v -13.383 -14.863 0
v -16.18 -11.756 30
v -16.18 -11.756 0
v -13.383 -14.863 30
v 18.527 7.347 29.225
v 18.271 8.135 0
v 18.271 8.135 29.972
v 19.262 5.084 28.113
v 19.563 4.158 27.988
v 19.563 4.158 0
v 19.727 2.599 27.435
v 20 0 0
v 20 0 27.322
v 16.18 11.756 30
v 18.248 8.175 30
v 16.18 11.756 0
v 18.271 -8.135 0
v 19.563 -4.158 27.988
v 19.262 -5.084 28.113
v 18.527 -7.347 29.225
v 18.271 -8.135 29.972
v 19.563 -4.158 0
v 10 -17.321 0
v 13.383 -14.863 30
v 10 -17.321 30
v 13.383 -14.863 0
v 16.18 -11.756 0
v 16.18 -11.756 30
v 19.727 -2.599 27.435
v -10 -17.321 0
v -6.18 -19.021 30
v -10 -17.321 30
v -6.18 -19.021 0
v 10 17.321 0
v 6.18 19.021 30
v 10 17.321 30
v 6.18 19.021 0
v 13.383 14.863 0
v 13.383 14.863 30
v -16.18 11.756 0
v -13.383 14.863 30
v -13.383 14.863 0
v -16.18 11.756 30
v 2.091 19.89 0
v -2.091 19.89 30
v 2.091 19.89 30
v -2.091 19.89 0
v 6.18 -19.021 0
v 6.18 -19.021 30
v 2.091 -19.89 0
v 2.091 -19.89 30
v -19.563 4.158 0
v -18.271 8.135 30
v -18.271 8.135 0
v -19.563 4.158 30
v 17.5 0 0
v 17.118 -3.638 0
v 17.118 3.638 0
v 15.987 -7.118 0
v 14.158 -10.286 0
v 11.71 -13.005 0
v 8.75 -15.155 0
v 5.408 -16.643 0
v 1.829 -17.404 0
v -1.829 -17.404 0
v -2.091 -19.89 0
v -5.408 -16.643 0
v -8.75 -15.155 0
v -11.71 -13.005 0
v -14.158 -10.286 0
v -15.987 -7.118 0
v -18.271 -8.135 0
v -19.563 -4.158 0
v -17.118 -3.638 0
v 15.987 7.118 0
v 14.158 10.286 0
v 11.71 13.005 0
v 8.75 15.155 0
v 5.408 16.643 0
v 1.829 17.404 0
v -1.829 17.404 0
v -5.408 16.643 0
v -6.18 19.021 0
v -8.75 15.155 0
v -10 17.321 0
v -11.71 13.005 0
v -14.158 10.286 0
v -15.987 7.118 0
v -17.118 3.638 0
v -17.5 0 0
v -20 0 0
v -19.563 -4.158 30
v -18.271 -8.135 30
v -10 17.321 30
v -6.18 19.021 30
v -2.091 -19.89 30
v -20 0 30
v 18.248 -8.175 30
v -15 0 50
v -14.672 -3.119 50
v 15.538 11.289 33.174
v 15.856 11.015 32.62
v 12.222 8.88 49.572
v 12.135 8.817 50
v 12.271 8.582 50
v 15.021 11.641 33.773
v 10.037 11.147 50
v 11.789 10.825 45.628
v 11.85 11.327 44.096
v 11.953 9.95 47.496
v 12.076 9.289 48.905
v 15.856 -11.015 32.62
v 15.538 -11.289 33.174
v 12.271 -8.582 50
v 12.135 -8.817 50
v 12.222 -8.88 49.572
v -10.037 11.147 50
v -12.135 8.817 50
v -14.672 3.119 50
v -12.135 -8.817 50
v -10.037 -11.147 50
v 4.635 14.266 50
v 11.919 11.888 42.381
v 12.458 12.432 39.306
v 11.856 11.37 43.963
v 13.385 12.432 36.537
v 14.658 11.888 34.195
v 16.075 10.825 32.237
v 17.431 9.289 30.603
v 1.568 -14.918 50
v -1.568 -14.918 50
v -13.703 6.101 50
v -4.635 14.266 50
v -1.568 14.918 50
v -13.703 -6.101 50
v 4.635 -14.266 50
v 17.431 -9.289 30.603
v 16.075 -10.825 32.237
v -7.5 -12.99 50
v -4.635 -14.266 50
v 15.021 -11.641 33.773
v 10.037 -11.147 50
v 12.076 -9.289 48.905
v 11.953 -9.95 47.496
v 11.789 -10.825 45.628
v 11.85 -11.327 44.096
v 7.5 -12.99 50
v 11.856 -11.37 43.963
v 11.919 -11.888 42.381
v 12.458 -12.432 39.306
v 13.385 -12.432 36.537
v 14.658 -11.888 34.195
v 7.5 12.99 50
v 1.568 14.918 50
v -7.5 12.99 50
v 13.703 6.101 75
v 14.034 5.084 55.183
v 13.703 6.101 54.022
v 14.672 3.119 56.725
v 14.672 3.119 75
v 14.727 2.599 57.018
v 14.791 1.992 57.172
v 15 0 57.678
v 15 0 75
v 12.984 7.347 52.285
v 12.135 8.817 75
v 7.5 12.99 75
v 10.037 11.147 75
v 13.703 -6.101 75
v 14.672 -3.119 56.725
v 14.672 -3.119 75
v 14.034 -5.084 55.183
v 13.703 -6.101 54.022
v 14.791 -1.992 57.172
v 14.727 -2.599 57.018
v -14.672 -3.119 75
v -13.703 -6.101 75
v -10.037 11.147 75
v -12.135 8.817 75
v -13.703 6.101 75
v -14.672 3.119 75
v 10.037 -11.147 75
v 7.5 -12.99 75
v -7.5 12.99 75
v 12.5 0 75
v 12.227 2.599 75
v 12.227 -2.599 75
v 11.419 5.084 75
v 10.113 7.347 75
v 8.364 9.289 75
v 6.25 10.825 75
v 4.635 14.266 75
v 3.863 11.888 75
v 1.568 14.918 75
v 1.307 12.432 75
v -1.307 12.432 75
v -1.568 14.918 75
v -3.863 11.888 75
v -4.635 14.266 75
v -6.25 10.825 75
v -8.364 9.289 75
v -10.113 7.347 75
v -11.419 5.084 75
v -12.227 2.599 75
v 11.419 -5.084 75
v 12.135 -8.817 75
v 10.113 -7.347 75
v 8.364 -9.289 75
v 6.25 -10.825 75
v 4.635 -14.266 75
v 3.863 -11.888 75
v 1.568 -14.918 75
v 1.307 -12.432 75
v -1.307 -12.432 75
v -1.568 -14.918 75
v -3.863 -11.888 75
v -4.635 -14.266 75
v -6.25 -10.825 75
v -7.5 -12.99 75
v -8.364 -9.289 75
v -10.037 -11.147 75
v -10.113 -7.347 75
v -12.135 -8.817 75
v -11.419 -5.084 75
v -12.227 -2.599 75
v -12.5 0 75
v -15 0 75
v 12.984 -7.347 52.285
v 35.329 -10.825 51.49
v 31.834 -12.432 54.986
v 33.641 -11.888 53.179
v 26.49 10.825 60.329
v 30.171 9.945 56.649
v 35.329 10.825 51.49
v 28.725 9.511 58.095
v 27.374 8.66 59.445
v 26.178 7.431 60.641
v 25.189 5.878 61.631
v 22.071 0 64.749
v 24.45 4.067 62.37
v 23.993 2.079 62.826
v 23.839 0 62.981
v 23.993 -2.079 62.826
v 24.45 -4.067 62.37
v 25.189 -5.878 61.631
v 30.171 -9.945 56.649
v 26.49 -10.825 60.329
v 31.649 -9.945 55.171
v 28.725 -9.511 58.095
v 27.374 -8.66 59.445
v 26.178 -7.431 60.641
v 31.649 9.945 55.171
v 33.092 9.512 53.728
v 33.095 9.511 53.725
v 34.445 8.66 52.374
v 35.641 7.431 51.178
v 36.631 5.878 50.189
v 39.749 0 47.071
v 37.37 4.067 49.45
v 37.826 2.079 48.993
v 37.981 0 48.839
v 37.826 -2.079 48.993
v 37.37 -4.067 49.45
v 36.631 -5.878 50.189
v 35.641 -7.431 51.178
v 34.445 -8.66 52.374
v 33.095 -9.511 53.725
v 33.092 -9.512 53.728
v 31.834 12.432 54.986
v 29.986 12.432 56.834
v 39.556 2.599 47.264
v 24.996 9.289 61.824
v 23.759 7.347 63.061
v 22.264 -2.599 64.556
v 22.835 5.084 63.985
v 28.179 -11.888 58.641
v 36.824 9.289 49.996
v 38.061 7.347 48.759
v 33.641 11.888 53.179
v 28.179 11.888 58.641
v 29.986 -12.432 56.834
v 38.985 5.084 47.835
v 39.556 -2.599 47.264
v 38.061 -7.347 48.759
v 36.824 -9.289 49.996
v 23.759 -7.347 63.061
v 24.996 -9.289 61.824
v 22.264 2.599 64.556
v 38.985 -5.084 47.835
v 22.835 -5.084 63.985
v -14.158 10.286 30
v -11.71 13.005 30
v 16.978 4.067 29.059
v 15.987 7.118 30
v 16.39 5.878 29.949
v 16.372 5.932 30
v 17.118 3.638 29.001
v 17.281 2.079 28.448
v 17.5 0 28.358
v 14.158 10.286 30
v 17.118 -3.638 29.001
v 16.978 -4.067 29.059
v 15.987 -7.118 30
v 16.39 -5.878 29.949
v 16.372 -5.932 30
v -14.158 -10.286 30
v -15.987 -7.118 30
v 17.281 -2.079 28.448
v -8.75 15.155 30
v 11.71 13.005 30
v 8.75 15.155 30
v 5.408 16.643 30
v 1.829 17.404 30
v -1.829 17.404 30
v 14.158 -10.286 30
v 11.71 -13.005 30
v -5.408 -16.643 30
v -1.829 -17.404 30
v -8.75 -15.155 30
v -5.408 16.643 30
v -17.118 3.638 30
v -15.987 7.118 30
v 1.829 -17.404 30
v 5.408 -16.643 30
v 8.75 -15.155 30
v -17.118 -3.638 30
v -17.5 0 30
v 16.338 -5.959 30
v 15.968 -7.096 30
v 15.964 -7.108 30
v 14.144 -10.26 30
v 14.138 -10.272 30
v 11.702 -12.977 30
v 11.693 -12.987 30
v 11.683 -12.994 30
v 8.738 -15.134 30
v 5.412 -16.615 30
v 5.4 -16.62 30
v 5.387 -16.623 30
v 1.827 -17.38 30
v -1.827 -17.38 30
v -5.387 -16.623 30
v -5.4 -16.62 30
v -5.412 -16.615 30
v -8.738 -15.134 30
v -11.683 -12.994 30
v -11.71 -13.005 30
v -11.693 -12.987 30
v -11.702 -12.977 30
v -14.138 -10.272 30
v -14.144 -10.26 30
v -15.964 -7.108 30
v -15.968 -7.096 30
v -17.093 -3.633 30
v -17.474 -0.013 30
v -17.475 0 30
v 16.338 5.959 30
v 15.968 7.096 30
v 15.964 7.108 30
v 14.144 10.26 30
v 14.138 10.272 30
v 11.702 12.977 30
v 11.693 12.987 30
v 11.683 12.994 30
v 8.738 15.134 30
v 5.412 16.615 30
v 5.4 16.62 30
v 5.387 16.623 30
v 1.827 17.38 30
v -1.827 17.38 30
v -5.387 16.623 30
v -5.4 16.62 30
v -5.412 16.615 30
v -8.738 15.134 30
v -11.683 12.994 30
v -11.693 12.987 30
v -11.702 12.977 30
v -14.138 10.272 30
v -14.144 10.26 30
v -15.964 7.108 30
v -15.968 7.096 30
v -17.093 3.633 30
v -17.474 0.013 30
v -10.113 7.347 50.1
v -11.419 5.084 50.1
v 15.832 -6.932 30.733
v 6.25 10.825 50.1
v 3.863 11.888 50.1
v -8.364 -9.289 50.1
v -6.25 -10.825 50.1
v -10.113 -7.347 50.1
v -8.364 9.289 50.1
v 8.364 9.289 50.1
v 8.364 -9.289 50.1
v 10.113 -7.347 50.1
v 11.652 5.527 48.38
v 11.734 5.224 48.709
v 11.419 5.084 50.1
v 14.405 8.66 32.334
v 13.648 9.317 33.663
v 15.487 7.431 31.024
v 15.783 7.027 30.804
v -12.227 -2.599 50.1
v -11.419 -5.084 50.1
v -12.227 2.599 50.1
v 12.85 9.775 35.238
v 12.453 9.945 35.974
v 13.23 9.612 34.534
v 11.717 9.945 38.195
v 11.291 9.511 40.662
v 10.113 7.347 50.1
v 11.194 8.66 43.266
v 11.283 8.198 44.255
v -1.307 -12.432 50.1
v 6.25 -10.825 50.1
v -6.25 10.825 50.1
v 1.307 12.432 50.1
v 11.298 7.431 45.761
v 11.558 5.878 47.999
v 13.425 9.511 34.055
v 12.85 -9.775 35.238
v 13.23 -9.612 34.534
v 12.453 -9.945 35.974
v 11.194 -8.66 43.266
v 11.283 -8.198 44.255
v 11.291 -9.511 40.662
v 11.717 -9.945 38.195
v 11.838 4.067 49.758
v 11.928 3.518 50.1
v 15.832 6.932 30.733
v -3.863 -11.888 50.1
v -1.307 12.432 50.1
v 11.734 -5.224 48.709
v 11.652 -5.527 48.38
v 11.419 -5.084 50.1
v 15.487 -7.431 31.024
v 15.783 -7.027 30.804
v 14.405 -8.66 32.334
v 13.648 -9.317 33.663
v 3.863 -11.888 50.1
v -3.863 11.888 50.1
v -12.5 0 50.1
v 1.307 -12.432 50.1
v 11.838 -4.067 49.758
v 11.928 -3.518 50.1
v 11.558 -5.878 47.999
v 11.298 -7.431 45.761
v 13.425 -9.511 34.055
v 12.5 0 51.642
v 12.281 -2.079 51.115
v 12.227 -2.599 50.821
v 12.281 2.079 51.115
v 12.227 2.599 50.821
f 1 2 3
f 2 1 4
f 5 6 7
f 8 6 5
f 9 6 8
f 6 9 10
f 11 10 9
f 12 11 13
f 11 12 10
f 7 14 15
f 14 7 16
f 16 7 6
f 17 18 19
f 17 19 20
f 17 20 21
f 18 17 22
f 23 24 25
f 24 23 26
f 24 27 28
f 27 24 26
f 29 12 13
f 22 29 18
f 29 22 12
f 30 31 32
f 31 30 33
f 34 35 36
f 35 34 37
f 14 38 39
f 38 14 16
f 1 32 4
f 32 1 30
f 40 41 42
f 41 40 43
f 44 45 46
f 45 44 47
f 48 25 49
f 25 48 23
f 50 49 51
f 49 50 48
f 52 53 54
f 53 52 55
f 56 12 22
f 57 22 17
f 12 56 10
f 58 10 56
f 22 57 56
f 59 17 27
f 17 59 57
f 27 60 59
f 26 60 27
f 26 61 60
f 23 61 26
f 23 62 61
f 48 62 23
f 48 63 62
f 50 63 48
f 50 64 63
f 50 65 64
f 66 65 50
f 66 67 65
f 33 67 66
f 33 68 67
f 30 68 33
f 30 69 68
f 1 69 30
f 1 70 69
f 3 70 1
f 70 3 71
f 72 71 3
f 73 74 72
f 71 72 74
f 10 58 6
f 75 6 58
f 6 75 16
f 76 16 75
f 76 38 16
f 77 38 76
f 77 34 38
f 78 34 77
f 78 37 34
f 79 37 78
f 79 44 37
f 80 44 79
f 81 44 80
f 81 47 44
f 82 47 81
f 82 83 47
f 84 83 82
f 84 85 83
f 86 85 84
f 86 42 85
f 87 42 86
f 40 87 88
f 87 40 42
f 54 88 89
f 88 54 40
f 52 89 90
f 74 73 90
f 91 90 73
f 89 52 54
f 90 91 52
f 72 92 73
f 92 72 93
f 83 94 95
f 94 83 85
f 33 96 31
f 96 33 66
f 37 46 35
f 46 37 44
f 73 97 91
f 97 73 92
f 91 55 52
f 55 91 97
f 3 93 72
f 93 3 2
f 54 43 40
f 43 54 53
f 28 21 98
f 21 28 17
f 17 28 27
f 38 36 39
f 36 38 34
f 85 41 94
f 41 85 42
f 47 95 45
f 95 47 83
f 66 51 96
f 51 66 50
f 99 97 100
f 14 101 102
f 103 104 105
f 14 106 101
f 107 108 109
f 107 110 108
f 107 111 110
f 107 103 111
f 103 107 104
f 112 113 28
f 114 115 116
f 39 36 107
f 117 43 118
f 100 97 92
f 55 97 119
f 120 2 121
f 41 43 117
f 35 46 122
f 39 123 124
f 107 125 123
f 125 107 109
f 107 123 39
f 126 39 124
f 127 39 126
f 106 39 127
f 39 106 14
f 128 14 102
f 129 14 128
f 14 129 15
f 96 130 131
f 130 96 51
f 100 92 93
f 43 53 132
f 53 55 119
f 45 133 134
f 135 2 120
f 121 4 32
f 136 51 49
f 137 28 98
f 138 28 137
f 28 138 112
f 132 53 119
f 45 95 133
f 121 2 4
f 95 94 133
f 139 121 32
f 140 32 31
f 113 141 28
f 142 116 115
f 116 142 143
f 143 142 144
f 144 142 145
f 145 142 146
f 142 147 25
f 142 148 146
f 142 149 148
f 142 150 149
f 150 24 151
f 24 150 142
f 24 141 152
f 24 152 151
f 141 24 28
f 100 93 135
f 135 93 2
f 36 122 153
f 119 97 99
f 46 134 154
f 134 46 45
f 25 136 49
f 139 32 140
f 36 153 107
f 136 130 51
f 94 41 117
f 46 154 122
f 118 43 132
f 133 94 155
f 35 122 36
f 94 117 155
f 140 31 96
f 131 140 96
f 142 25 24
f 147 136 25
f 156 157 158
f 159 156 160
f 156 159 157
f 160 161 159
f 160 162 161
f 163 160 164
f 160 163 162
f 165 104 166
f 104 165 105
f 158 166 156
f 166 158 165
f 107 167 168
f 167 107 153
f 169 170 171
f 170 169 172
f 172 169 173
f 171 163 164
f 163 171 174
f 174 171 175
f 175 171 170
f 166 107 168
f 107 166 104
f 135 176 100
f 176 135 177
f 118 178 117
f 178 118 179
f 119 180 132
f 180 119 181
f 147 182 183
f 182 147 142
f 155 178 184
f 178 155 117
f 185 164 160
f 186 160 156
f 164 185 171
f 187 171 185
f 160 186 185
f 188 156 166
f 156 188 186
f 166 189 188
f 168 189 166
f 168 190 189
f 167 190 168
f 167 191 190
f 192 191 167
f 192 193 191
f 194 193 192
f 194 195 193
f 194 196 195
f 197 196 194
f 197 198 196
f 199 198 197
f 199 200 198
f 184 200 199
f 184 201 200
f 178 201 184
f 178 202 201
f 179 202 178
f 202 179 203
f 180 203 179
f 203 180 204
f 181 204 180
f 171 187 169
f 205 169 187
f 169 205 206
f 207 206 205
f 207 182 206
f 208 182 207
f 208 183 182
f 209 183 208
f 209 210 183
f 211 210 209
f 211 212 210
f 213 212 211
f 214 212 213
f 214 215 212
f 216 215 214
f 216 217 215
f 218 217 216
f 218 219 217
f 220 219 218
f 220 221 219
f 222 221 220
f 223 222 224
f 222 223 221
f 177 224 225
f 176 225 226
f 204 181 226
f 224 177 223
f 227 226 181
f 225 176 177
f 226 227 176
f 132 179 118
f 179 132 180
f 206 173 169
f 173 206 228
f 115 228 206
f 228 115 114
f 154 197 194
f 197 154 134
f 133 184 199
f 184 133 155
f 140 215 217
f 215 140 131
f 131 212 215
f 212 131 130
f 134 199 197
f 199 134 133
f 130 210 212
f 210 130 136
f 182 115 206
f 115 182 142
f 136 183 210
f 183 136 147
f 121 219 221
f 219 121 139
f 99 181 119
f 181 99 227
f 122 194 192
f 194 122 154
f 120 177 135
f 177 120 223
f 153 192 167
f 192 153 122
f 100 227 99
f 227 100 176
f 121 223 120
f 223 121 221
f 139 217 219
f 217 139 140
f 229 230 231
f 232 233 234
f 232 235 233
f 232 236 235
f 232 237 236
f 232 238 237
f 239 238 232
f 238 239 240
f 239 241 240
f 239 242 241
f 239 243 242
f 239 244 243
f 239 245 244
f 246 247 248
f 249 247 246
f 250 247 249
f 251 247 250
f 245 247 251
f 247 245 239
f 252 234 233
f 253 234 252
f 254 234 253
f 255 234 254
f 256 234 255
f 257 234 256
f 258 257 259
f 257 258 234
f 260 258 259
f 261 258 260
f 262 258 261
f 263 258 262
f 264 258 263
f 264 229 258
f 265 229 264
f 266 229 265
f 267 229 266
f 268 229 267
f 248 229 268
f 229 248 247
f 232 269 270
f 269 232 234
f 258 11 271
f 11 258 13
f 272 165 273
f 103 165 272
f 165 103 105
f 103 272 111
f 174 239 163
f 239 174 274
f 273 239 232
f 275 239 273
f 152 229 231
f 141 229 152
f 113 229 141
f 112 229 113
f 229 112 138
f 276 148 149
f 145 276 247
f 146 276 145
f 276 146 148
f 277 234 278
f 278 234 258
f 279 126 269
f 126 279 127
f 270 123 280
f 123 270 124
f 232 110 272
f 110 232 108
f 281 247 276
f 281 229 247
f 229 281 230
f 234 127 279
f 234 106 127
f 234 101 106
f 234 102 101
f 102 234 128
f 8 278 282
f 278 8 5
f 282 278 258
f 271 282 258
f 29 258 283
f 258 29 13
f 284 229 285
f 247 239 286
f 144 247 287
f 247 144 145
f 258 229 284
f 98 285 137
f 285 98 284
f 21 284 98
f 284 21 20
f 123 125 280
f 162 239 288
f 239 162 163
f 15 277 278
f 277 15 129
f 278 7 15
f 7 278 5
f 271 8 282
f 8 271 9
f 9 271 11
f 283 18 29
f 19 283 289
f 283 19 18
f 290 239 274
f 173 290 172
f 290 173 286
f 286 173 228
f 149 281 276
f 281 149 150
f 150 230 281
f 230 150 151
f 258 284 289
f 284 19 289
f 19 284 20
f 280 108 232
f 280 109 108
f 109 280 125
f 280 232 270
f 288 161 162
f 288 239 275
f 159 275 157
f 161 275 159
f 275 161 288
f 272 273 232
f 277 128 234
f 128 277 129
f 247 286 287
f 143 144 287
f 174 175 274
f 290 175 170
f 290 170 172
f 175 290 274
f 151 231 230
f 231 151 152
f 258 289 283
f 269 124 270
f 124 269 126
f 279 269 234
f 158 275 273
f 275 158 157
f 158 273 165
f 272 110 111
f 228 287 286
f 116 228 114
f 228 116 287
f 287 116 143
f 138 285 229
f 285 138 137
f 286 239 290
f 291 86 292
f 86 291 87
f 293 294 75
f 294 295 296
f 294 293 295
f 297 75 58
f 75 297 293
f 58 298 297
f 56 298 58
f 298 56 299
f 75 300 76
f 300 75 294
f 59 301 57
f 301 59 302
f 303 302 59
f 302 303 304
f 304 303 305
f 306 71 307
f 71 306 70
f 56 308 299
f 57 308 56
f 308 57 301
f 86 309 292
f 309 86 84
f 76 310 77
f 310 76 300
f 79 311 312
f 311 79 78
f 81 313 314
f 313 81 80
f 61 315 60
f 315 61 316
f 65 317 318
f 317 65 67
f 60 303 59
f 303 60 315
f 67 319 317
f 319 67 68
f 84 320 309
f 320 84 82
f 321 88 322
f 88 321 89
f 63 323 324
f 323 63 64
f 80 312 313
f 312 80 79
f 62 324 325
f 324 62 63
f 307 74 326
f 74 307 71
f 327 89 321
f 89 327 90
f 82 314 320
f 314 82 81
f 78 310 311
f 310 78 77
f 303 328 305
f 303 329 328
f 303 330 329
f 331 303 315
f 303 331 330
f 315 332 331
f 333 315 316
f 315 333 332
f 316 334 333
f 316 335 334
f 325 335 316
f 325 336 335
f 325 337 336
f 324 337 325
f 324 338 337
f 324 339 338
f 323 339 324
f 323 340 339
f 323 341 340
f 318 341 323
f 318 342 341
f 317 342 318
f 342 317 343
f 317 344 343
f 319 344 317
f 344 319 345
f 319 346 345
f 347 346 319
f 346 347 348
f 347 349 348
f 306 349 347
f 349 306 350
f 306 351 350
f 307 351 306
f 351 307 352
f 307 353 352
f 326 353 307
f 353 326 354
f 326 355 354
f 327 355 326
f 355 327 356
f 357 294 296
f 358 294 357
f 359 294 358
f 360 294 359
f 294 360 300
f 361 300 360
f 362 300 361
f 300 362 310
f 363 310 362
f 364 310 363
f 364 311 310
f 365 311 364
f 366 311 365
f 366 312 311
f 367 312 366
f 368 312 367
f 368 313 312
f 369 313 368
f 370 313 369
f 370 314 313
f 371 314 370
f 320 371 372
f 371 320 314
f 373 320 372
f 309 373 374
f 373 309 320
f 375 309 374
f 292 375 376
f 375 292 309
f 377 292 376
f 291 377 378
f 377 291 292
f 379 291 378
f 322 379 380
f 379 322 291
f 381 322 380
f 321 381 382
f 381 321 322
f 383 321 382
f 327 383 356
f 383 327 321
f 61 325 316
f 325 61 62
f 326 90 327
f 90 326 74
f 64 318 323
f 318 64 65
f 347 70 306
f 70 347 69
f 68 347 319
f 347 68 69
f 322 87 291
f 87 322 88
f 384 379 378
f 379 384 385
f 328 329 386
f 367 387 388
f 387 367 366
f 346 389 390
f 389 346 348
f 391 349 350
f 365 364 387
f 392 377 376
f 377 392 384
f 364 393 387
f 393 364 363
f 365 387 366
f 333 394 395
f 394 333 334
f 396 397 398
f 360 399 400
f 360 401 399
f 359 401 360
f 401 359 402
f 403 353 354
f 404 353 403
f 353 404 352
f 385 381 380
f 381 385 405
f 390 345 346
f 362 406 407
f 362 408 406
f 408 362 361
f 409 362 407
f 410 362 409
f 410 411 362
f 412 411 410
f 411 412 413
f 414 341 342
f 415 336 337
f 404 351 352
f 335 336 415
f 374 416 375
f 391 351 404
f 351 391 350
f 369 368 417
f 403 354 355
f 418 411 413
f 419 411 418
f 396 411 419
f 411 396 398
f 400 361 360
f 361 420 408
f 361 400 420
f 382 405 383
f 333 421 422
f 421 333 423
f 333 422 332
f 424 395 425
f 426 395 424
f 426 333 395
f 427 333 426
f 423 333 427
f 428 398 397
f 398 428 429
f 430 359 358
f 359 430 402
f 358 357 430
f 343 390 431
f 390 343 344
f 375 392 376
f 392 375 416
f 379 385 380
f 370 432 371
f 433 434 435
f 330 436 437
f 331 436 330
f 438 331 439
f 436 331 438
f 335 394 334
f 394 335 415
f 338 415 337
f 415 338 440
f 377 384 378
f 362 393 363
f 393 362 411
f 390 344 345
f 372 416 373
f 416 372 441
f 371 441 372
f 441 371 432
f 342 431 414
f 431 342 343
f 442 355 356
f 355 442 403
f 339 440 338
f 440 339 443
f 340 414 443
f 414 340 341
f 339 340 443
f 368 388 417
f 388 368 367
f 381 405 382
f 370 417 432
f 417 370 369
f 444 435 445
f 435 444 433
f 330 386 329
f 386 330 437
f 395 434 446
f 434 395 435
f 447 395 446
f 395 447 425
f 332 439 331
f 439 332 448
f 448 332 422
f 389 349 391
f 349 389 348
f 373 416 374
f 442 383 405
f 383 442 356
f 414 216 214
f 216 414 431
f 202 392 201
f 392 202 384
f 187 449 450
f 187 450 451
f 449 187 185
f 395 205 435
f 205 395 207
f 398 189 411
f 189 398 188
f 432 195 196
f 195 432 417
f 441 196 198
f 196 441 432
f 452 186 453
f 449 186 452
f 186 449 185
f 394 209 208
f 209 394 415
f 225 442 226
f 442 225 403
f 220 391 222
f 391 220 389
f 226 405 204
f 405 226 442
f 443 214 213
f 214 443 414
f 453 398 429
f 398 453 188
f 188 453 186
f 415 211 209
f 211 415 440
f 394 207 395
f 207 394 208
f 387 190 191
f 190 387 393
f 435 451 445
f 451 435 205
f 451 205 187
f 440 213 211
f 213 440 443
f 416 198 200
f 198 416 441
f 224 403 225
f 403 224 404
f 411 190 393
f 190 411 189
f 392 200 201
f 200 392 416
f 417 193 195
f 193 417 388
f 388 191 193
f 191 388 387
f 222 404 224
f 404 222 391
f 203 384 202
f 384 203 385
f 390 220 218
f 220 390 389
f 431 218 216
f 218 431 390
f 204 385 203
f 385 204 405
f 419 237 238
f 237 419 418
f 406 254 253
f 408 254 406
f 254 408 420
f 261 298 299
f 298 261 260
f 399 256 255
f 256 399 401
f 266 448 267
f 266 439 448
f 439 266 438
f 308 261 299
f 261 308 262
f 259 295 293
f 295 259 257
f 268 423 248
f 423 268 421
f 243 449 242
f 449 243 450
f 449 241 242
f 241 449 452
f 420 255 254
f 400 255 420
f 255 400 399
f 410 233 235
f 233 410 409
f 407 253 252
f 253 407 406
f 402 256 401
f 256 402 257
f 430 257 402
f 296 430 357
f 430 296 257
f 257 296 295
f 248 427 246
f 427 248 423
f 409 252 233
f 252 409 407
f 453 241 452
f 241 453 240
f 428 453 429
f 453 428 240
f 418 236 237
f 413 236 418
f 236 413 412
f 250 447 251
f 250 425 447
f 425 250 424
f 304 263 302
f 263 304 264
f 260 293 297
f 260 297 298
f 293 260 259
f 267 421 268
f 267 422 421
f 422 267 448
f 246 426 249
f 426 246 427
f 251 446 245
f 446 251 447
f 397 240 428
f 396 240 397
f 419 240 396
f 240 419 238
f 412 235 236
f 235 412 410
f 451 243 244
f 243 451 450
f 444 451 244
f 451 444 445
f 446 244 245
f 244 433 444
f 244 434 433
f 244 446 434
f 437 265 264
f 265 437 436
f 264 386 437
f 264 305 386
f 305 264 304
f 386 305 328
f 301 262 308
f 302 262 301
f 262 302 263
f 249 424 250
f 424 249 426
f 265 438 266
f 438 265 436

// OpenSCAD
// Parametric Dust Hose Adapter
// Creates a dust hose adapter with conical transition between different diameters
// 吕 minimaple 

// ===== PARAMETERS =====

// Top section parameters
inner_diameter_TOP = 35;    // Inner diameter of top section
outer_diameter_TOP = 40;    // Outer diameter of top section
top_length = 30;            // Length of top section

// Bottom section parameters
inner_diameter_BOT = 25;    // Inner diameter of bottom section
outer_diameter_BOT = 30;    // Outer diameter of bottom section
bot_length = 25;            // Length of bottom section

// Mid section parameters
mid_length = 20;            // Length of conical mid section

// Side port parameters
inner_diameter_SIDE = 20;   // Inner diameter of side port
outer_diameter_SIDE = 25;   // Outer diameter of side port
side_length = 45;           // Length of side port
side_angle = 45;            // Angle at which side port sticks out (degrees)

// General parameters
wall_thickness = 2;         // Wall thickness (calculated from inner/outer diameters)
poop = 0.1;                 // Small overlap for boolean operations


// Engrave the 吕 logo on the front face
module logo() {
    logo_width = 7;           // Width of the bottom box
    logo_height = 4;           // Height of the bottom box
    logo_top_scale = 0.8;      // Ratio of top box width to bottom box
    logo_spacing = 1.5;          // Vertical gap between the two boxes

     minkowski() {
        rotate([90,0,0]) {
            scale([logo_scale, logo_scale, 1]) {  // scale X and Y, keep Z (depth) unchanged
                union() {
                    // Bottom box
                    translate([-logo_width/2, -logo_height/2, 0])
                        cube([logo_width, logo_height, logo_depth+poop]);
                    
                    // Top box
                    translate([-logo_width*logo_top_scale/2, logo_height/2 + logo_spacing, 0])
                        cube([logo_width*logo_top_scale, logo_height, logo_depth+poop]);
                }
            }
        };
        sphere(r = 0.2, $fn = 24); 
    }
    
}


module dust_hose_adapter() {
    difference() {
        union() {
            // Top cylinder
            translate([0, 0, 0]) {
                cylinder(h = top_length, d = outer_diameter_TOP, center = false);
            }
            
            // Conical mid section
            translate([0, 0, top_length]) {
                cylinder(h = mid_length, d1 = outer_diameter_TOP, d2 = outer_diameter_BOT, center = false);
            }
            
            // Bottom cylinder
            translate([0, 0, top_length + mid_length]) {
                cylinder(h = bot_length, d = outer_diameter_BOT, center = false);
            }
            
            // Side port
            translate([(inner_diameter_TOP + inner_diameter_BOT)/4, 0, top_length + mid_length/2]) {
                rotate([0, side_angle, 0]) {
                    translate([0, 0, -side_length/2]) {
                        cylinder(h = side_length, d = outer_diameter_SIDE, center = false);
                    }
                }
            }
        }
        
        // Cut out inner passages
        // Top inner passage
        translate([0, 0, -poop]) {
            cylinder(h = top_length + poop, d = inner_diameter_TOP, center = false);
        }
        
        // Conical inner passage
        translate([0, 0, top_length - poop]) {
            cylinder(h = mid_length + 2*poop, d1 = inner_diameter_TOP, d2 = inner_diameter_BOT, center = false);
        }
        
        // Bottom inner passage
        translate([0, 0, top_length + mid_length - poop]) {
            cylinder(h = bot_length + poop*2, d = inner_diameter_BOT, center = false);
        }
        
        // Side port inner passage
        translate([(inner_diameter_TOP + inner_diameter_BOT)/4, 0, top_length + mid_length/2]) {
            rotate([0, side_angle, 0]) {
                translate([0, 0, -side_length/2 - poop]) {
                    cylinder(h = side_length + 2*poop, d = inner_diameter_SIDE, center = false);
                }
            }
        }
    }
}



// ===== RENDERING =====

dust_hose_adapter(); 
